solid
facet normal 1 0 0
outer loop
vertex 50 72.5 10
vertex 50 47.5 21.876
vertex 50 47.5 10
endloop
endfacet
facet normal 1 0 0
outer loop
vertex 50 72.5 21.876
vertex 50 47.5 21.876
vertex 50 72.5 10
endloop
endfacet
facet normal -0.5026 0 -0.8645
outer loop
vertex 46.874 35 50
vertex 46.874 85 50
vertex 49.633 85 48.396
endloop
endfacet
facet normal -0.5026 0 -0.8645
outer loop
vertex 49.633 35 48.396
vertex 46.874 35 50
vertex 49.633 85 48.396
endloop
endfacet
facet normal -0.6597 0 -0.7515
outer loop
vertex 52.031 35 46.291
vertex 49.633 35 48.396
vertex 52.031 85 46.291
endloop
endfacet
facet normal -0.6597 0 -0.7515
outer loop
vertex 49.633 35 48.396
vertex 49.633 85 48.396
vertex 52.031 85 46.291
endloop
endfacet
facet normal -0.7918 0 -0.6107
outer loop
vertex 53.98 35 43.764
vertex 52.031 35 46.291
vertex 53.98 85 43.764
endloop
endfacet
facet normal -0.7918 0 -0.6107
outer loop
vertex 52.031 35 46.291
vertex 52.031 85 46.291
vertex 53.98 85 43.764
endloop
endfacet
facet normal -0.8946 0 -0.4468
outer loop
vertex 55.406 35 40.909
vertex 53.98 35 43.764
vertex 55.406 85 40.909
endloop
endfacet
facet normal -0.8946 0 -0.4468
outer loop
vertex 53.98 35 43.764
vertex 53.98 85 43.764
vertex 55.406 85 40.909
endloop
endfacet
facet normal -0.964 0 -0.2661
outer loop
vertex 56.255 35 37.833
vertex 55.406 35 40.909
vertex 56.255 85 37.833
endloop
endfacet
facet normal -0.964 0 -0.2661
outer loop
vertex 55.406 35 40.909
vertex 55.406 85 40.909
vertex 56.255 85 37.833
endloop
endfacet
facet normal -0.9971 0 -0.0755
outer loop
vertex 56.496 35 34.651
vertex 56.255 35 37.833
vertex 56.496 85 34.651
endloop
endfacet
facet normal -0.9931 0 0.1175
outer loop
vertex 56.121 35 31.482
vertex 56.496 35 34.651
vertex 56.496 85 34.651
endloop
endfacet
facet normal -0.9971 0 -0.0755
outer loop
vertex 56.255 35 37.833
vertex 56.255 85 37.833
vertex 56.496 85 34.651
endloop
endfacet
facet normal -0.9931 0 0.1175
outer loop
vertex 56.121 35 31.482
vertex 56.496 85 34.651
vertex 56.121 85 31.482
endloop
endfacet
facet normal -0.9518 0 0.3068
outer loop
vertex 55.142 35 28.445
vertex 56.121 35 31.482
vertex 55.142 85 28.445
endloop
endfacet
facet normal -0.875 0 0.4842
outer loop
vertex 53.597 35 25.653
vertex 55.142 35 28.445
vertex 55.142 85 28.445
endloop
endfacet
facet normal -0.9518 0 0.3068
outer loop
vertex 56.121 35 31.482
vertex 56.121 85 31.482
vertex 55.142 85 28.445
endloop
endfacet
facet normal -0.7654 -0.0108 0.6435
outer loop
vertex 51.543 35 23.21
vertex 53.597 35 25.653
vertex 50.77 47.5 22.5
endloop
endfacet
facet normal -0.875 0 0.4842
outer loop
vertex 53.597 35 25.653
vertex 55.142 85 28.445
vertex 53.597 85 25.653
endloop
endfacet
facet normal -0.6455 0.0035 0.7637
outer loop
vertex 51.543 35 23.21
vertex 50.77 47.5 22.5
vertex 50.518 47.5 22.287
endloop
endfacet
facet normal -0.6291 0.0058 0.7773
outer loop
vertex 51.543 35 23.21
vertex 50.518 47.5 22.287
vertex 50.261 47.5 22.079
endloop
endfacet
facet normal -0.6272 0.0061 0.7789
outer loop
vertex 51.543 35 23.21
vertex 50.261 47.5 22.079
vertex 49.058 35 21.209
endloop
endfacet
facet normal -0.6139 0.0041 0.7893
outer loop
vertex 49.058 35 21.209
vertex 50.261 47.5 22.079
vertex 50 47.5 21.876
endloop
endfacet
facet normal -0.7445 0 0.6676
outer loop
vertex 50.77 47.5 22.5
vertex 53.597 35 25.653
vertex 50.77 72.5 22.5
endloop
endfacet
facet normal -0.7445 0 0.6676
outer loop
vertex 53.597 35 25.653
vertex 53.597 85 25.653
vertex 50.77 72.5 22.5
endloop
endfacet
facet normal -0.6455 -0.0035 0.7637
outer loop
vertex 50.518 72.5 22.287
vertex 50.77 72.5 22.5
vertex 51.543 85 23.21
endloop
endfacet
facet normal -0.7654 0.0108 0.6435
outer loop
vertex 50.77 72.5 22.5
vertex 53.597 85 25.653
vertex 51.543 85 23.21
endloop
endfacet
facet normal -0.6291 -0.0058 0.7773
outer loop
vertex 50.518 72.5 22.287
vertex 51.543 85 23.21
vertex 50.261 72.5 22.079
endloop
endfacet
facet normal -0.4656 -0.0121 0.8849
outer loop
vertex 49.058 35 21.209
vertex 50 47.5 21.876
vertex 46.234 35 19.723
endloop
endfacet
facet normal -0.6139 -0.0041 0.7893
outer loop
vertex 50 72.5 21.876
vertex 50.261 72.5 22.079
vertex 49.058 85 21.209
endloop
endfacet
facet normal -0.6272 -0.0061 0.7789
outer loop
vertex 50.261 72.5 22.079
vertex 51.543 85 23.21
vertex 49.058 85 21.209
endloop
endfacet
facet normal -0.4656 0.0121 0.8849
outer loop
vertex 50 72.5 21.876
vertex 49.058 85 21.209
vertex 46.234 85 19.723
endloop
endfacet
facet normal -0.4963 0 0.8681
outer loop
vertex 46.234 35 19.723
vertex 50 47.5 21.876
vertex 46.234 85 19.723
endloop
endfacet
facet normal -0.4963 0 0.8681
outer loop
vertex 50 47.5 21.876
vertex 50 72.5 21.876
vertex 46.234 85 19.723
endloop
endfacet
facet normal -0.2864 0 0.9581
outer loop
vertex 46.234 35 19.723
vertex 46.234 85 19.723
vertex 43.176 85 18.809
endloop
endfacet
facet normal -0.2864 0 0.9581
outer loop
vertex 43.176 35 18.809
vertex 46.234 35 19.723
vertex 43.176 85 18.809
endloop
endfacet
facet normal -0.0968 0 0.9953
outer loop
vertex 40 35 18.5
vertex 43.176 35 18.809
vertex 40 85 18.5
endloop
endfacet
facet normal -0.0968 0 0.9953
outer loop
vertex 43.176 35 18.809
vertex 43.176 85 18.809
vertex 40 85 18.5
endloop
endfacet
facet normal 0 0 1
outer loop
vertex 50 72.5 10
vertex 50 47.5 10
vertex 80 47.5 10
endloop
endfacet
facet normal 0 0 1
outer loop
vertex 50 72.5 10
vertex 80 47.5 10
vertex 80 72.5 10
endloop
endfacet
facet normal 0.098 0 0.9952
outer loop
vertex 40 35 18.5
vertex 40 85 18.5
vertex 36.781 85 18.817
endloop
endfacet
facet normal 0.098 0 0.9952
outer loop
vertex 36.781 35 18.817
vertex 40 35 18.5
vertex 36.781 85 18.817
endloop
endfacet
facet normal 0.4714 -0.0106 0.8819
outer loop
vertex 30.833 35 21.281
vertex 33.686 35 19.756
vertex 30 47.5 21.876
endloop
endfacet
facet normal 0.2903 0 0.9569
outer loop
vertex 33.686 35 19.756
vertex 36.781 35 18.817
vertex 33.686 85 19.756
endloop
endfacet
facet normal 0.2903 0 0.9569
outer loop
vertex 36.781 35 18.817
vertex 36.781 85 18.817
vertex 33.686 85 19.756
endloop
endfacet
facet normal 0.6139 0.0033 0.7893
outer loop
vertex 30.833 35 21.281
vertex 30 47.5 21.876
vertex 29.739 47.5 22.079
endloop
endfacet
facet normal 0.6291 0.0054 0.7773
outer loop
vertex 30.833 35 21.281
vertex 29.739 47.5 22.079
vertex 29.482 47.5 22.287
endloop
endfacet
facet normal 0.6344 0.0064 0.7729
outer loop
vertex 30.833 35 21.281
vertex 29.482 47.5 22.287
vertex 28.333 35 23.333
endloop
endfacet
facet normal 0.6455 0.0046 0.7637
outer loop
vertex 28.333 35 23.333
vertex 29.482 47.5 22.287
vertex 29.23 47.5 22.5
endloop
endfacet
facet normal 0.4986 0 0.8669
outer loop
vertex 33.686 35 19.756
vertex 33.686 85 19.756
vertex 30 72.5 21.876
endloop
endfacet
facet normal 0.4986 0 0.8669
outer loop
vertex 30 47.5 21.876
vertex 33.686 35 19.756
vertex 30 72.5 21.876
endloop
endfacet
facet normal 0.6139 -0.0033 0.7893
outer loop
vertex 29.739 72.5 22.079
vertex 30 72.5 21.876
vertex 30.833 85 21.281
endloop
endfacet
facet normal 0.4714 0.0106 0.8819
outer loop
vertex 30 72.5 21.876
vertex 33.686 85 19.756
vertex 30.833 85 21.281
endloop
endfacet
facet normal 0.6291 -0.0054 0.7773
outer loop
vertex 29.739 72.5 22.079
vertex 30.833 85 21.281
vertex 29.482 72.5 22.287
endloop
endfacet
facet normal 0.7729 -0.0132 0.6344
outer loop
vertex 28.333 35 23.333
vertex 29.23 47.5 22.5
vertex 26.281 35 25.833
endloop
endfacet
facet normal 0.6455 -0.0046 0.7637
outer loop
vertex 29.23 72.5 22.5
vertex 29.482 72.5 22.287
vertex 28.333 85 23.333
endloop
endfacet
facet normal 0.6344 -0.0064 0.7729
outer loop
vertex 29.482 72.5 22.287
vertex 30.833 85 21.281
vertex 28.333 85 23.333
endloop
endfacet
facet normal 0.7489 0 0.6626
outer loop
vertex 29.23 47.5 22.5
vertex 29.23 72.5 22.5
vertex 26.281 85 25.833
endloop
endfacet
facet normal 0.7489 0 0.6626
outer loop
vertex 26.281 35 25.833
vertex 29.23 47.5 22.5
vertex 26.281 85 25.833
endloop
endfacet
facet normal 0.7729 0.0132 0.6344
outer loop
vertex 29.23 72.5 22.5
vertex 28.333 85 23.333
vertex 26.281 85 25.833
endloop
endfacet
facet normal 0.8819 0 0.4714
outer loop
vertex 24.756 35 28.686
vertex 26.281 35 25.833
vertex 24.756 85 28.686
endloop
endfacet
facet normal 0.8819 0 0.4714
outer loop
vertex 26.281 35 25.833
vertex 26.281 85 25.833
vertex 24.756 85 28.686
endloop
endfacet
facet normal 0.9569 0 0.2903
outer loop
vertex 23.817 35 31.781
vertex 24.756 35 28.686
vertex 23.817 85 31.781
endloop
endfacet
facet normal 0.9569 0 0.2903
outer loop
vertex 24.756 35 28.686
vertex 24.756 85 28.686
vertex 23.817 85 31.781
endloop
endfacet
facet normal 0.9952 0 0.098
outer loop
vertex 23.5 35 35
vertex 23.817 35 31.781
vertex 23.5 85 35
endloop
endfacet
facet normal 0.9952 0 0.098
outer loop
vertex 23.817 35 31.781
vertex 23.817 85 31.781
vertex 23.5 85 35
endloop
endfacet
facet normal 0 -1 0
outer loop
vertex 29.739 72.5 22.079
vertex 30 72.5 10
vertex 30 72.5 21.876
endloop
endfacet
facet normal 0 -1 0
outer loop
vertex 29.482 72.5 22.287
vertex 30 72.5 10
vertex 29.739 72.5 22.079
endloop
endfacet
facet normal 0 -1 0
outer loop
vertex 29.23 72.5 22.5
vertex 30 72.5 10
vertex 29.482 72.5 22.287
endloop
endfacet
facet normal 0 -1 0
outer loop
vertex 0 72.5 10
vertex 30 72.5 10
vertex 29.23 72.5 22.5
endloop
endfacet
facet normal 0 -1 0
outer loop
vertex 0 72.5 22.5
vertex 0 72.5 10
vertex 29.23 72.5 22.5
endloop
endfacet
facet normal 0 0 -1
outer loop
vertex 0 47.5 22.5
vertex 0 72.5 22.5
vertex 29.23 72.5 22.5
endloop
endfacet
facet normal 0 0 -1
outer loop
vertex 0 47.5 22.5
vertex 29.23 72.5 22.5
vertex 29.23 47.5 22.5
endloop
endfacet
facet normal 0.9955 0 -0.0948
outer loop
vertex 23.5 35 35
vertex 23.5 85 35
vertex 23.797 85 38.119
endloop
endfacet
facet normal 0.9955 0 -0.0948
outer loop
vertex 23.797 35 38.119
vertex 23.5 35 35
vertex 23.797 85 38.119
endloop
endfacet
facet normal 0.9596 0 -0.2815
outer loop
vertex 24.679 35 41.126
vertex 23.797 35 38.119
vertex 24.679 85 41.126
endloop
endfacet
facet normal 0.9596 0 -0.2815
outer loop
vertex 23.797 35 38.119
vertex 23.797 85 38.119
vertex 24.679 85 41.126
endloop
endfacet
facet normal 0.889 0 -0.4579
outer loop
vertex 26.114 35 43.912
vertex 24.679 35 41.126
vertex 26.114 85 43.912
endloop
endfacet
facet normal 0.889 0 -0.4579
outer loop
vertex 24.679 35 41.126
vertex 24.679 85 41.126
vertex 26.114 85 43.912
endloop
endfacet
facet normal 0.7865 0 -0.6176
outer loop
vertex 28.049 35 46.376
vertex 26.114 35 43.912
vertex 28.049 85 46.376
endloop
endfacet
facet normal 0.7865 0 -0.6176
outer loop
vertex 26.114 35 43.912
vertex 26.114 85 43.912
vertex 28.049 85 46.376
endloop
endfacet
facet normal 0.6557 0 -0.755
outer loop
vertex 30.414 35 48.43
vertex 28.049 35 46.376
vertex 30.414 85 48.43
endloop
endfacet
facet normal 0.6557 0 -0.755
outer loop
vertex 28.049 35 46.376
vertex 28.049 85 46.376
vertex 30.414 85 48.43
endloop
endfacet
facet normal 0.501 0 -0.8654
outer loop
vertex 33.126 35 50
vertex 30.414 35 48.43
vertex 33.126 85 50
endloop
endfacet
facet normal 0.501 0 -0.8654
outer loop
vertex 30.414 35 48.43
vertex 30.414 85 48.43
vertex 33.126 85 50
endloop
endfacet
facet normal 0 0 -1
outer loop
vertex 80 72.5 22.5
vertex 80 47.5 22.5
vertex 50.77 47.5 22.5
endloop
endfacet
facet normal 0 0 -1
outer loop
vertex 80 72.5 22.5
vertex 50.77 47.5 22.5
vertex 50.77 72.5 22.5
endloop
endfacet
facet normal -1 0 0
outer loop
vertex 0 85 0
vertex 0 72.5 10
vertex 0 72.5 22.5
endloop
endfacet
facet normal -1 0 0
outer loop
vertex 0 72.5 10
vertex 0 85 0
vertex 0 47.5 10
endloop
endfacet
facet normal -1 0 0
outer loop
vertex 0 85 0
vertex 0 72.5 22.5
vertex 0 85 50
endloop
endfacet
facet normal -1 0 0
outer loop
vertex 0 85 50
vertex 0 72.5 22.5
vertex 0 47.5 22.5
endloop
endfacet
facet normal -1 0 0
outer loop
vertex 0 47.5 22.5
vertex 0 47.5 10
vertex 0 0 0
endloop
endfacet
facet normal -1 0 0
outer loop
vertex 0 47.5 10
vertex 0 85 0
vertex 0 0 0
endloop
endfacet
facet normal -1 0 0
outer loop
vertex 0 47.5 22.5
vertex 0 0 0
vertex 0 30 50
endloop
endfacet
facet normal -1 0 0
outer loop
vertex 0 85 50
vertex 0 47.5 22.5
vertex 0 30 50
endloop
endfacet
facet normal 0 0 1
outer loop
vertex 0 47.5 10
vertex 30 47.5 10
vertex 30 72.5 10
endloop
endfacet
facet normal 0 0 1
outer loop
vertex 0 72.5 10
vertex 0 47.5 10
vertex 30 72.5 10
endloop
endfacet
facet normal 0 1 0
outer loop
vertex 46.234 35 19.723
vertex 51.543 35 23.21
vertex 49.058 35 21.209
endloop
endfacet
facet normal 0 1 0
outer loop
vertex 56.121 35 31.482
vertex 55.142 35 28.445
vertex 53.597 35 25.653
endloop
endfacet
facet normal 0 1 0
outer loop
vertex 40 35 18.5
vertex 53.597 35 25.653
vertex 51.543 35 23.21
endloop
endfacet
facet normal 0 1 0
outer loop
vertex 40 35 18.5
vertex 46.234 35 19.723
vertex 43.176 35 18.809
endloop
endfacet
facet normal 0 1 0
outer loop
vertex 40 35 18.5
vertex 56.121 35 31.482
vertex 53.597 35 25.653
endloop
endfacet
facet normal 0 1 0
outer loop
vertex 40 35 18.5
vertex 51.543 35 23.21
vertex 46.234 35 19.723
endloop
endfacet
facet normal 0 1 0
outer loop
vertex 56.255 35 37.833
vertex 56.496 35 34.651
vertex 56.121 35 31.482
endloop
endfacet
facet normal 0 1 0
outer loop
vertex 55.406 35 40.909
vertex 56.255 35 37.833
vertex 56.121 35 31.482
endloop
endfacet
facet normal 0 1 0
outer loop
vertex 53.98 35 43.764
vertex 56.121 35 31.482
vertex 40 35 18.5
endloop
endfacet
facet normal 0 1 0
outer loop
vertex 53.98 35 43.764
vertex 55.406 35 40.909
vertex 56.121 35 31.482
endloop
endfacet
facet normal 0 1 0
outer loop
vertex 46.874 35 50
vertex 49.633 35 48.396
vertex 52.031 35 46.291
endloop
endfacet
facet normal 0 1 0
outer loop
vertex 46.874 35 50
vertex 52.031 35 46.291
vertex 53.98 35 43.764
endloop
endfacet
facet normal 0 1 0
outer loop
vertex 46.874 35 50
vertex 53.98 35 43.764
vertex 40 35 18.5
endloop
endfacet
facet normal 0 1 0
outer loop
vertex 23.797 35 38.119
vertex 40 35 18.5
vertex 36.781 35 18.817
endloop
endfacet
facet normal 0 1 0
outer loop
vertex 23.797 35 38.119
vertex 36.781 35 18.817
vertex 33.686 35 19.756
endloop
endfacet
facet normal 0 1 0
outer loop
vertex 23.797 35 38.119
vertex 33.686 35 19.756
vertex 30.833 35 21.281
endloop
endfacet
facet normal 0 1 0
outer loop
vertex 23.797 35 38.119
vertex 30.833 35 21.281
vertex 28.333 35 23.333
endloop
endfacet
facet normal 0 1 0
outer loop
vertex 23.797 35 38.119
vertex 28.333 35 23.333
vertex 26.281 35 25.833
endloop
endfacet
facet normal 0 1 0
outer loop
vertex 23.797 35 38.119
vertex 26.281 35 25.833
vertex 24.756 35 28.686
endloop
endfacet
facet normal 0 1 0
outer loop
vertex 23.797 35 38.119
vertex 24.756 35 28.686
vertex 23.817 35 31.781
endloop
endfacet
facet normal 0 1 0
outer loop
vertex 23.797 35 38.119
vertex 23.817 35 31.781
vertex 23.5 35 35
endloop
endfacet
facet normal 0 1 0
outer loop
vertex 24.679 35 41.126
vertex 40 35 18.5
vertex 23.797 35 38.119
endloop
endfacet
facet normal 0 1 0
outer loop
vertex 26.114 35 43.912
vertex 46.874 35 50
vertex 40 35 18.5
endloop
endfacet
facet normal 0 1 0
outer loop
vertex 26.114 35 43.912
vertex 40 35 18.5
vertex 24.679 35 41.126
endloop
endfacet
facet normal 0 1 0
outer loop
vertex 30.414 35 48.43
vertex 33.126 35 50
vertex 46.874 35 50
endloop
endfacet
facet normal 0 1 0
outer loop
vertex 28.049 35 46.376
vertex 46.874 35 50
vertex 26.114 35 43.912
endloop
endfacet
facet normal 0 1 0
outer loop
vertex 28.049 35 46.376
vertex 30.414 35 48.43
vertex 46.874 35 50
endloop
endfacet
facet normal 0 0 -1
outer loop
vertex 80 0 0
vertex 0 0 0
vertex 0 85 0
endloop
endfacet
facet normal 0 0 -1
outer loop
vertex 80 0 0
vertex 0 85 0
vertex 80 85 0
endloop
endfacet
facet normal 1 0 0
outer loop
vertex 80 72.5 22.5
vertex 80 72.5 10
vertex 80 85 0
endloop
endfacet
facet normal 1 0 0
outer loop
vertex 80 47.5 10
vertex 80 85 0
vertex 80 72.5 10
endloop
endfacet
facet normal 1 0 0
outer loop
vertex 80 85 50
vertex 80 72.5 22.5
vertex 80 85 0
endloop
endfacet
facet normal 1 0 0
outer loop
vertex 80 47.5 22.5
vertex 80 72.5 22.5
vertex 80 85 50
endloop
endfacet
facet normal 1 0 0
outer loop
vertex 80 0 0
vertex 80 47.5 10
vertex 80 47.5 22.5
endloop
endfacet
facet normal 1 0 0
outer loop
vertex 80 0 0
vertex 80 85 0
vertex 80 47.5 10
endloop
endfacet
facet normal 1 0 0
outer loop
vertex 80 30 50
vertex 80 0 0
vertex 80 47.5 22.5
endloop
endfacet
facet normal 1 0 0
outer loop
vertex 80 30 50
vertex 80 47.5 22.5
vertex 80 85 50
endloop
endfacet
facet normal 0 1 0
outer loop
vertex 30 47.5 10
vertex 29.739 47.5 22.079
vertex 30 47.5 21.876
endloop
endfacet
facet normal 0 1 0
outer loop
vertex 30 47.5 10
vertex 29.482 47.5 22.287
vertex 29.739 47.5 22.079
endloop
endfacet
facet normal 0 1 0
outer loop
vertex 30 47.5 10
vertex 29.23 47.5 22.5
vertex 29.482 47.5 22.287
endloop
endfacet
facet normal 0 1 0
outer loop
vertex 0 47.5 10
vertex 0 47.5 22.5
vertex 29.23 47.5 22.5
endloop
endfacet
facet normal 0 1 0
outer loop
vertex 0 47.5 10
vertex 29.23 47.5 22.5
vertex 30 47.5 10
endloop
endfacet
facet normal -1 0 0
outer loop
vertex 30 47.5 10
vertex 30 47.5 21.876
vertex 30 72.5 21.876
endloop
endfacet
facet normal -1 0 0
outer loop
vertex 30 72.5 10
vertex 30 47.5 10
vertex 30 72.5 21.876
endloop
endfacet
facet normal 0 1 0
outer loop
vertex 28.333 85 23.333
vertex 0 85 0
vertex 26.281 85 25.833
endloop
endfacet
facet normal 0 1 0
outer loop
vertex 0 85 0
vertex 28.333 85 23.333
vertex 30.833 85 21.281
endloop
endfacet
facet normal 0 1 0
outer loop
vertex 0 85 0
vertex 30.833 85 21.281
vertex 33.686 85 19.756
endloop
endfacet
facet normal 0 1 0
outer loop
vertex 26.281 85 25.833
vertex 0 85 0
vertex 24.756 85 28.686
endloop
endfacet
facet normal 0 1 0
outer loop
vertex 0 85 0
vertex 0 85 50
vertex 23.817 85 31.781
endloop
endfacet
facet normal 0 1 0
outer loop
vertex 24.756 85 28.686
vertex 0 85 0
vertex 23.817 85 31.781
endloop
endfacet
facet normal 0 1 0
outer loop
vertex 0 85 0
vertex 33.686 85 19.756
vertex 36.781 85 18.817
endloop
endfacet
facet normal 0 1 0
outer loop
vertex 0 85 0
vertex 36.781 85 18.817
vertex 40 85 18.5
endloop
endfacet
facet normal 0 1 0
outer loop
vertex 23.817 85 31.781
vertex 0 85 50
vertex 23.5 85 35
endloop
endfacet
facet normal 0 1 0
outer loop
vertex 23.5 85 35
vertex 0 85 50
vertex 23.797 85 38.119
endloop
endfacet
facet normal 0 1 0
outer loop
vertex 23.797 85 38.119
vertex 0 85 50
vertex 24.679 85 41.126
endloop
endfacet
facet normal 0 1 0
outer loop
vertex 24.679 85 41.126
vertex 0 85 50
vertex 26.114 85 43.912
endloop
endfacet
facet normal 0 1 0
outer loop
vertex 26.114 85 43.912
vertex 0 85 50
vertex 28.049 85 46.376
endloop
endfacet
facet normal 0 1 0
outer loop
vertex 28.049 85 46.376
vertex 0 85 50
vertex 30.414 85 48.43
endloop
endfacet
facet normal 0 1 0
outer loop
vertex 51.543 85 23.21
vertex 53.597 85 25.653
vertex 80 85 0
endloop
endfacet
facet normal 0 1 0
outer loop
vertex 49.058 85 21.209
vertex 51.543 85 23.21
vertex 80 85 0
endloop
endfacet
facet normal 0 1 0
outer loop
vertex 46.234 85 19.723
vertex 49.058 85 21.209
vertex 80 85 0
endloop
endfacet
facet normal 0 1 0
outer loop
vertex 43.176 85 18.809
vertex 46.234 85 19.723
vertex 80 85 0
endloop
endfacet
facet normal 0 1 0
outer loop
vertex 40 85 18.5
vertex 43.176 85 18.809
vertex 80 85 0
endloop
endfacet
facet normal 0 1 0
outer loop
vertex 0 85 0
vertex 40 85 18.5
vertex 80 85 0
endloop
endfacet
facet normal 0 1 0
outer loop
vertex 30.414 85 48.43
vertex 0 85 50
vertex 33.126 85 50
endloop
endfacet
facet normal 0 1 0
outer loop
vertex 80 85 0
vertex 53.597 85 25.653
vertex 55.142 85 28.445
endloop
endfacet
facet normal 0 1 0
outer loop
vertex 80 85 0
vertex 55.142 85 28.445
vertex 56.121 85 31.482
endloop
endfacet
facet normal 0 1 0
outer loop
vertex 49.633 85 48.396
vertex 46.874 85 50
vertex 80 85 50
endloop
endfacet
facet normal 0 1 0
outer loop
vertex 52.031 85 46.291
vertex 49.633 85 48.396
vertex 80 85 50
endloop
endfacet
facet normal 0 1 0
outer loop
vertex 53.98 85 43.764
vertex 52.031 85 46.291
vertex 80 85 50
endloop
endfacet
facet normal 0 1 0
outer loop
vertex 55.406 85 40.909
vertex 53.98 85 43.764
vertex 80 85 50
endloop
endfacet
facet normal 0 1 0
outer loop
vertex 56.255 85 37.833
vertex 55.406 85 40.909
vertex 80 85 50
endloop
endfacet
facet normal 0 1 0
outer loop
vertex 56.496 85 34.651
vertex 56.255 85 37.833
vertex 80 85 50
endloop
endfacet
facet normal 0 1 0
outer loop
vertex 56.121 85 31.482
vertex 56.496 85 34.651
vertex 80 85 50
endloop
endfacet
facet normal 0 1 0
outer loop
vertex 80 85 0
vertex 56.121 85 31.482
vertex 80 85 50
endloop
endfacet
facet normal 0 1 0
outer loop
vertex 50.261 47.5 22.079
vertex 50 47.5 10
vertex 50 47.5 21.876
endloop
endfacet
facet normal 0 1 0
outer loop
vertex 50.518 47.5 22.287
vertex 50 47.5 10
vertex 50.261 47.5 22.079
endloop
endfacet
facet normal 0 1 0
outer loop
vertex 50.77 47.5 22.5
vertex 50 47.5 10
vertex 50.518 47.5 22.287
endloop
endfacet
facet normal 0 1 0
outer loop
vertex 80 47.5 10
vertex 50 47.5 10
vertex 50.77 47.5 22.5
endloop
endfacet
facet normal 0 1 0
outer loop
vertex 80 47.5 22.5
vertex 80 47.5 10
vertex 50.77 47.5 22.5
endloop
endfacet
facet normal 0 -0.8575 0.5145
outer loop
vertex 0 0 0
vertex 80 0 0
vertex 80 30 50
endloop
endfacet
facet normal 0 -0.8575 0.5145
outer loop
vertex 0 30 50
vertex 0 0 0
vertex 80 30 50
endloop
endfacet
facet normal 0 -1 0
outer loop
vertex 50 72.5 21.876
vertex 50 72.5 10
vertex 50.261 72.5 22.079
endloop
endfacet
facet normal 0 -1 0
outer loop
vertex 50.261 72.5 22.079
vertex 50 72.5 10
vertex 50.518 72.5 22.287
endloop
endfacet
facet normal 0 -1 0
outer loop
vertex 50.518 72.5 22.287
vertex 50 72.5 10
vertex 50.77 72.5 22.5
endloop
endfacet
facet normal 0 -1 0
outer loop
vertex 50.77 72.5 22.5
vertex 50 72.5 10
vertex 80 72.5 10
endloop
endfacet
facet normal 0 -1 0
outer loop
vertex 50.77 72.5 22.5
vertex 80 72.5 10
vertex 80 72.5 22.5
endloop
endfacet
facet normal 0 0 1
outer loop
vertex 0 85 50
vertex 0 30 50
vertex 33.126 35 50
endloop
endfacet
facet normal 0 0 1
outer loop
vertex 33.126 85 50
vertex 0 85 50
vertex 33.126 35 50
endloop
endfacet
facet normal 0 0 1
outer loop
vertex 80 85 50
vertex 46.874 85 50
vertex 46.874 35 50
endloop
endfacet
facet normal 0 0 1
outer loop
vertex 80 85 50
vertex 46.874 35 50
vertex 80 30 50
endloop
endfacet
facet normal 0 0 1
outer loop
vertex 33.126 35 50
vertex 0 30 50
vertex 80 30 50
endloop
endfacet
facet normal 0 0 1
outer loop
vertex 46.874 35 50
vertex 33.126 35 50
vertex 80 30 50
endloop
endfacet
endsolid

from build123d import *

# Parameters (mm, degrees)
F0_W     = 80
F0_H     = 50
F1_DEPTH = 85
F3_DEPTH = 30
F5_W     = 25
F5_H     = 12.5
F6_DEPTH = 30
F7_DEPTH = 80
F9_DEPTH = 50


with BuildPart() as f1:
    # F0 (on Front) → F1 (new body)
    with BuildSketch(Plane.XZ):
        with Locations((40, 25)):
            Rectangle(F0_W, F0_H)
    extrude(amount=-F1_DEPTH)

    # F2 (on Right) → F3 (cut)
    with BuildSketch(Plane.YZ):
        Polygon((47.5, 10), (55, 10), (72.5, 10), (72.5, 22.5), (47.5, 22.5), align=None)
    extrude(amount=F3_DEPTH, mode=Mode.SUBTRACT)

    # F5 (on offset) → F6 (cut)
    with BuildSketch(Plane.YZ.offset(80)):
        with Locations((60, 16.25)):
            Rectangle(F5_W, F5_H)
    extrude(amount=-F6_DEPTH, mode=Mode.SUBTRACT)

    # F2 (on Right) → F7 (cut)
    with BuildSketch(Plane.YZ):
        Polygon((0, 30), (0, 0), (30, 50), (0, 50), align=None)
    extrude(amount=F7_DEPTH, mode=Mode.SUBTRACT)

    # F8 (on face) → F9 (cut)
    with BuildSketch(Plane(origin=(0, 85, 0), x_dir=(-1, 0, 0), z_dir=(0, 1, 0))):
        with BuildLine():
            ThreePointArc((-46.8738635424, 50), (-56.1206389452, 31.4821881801), (-40, 18.5))
            ThreePointArc((-40, 18.5), (-28.3327381104, 23.3327381104), (-23.5, 35))
            ThreePointArc((-23.5, 35), (-26.1135182921, 43.9115445224), (-33.1261364576, 50))
            Line((-33.1261364576, 50), (-46.8738635424, 50))
        make_face()
    extrude(amount=-F9_DEPTH, mode=Mode.SUBTRACT)


solid = f1.part
